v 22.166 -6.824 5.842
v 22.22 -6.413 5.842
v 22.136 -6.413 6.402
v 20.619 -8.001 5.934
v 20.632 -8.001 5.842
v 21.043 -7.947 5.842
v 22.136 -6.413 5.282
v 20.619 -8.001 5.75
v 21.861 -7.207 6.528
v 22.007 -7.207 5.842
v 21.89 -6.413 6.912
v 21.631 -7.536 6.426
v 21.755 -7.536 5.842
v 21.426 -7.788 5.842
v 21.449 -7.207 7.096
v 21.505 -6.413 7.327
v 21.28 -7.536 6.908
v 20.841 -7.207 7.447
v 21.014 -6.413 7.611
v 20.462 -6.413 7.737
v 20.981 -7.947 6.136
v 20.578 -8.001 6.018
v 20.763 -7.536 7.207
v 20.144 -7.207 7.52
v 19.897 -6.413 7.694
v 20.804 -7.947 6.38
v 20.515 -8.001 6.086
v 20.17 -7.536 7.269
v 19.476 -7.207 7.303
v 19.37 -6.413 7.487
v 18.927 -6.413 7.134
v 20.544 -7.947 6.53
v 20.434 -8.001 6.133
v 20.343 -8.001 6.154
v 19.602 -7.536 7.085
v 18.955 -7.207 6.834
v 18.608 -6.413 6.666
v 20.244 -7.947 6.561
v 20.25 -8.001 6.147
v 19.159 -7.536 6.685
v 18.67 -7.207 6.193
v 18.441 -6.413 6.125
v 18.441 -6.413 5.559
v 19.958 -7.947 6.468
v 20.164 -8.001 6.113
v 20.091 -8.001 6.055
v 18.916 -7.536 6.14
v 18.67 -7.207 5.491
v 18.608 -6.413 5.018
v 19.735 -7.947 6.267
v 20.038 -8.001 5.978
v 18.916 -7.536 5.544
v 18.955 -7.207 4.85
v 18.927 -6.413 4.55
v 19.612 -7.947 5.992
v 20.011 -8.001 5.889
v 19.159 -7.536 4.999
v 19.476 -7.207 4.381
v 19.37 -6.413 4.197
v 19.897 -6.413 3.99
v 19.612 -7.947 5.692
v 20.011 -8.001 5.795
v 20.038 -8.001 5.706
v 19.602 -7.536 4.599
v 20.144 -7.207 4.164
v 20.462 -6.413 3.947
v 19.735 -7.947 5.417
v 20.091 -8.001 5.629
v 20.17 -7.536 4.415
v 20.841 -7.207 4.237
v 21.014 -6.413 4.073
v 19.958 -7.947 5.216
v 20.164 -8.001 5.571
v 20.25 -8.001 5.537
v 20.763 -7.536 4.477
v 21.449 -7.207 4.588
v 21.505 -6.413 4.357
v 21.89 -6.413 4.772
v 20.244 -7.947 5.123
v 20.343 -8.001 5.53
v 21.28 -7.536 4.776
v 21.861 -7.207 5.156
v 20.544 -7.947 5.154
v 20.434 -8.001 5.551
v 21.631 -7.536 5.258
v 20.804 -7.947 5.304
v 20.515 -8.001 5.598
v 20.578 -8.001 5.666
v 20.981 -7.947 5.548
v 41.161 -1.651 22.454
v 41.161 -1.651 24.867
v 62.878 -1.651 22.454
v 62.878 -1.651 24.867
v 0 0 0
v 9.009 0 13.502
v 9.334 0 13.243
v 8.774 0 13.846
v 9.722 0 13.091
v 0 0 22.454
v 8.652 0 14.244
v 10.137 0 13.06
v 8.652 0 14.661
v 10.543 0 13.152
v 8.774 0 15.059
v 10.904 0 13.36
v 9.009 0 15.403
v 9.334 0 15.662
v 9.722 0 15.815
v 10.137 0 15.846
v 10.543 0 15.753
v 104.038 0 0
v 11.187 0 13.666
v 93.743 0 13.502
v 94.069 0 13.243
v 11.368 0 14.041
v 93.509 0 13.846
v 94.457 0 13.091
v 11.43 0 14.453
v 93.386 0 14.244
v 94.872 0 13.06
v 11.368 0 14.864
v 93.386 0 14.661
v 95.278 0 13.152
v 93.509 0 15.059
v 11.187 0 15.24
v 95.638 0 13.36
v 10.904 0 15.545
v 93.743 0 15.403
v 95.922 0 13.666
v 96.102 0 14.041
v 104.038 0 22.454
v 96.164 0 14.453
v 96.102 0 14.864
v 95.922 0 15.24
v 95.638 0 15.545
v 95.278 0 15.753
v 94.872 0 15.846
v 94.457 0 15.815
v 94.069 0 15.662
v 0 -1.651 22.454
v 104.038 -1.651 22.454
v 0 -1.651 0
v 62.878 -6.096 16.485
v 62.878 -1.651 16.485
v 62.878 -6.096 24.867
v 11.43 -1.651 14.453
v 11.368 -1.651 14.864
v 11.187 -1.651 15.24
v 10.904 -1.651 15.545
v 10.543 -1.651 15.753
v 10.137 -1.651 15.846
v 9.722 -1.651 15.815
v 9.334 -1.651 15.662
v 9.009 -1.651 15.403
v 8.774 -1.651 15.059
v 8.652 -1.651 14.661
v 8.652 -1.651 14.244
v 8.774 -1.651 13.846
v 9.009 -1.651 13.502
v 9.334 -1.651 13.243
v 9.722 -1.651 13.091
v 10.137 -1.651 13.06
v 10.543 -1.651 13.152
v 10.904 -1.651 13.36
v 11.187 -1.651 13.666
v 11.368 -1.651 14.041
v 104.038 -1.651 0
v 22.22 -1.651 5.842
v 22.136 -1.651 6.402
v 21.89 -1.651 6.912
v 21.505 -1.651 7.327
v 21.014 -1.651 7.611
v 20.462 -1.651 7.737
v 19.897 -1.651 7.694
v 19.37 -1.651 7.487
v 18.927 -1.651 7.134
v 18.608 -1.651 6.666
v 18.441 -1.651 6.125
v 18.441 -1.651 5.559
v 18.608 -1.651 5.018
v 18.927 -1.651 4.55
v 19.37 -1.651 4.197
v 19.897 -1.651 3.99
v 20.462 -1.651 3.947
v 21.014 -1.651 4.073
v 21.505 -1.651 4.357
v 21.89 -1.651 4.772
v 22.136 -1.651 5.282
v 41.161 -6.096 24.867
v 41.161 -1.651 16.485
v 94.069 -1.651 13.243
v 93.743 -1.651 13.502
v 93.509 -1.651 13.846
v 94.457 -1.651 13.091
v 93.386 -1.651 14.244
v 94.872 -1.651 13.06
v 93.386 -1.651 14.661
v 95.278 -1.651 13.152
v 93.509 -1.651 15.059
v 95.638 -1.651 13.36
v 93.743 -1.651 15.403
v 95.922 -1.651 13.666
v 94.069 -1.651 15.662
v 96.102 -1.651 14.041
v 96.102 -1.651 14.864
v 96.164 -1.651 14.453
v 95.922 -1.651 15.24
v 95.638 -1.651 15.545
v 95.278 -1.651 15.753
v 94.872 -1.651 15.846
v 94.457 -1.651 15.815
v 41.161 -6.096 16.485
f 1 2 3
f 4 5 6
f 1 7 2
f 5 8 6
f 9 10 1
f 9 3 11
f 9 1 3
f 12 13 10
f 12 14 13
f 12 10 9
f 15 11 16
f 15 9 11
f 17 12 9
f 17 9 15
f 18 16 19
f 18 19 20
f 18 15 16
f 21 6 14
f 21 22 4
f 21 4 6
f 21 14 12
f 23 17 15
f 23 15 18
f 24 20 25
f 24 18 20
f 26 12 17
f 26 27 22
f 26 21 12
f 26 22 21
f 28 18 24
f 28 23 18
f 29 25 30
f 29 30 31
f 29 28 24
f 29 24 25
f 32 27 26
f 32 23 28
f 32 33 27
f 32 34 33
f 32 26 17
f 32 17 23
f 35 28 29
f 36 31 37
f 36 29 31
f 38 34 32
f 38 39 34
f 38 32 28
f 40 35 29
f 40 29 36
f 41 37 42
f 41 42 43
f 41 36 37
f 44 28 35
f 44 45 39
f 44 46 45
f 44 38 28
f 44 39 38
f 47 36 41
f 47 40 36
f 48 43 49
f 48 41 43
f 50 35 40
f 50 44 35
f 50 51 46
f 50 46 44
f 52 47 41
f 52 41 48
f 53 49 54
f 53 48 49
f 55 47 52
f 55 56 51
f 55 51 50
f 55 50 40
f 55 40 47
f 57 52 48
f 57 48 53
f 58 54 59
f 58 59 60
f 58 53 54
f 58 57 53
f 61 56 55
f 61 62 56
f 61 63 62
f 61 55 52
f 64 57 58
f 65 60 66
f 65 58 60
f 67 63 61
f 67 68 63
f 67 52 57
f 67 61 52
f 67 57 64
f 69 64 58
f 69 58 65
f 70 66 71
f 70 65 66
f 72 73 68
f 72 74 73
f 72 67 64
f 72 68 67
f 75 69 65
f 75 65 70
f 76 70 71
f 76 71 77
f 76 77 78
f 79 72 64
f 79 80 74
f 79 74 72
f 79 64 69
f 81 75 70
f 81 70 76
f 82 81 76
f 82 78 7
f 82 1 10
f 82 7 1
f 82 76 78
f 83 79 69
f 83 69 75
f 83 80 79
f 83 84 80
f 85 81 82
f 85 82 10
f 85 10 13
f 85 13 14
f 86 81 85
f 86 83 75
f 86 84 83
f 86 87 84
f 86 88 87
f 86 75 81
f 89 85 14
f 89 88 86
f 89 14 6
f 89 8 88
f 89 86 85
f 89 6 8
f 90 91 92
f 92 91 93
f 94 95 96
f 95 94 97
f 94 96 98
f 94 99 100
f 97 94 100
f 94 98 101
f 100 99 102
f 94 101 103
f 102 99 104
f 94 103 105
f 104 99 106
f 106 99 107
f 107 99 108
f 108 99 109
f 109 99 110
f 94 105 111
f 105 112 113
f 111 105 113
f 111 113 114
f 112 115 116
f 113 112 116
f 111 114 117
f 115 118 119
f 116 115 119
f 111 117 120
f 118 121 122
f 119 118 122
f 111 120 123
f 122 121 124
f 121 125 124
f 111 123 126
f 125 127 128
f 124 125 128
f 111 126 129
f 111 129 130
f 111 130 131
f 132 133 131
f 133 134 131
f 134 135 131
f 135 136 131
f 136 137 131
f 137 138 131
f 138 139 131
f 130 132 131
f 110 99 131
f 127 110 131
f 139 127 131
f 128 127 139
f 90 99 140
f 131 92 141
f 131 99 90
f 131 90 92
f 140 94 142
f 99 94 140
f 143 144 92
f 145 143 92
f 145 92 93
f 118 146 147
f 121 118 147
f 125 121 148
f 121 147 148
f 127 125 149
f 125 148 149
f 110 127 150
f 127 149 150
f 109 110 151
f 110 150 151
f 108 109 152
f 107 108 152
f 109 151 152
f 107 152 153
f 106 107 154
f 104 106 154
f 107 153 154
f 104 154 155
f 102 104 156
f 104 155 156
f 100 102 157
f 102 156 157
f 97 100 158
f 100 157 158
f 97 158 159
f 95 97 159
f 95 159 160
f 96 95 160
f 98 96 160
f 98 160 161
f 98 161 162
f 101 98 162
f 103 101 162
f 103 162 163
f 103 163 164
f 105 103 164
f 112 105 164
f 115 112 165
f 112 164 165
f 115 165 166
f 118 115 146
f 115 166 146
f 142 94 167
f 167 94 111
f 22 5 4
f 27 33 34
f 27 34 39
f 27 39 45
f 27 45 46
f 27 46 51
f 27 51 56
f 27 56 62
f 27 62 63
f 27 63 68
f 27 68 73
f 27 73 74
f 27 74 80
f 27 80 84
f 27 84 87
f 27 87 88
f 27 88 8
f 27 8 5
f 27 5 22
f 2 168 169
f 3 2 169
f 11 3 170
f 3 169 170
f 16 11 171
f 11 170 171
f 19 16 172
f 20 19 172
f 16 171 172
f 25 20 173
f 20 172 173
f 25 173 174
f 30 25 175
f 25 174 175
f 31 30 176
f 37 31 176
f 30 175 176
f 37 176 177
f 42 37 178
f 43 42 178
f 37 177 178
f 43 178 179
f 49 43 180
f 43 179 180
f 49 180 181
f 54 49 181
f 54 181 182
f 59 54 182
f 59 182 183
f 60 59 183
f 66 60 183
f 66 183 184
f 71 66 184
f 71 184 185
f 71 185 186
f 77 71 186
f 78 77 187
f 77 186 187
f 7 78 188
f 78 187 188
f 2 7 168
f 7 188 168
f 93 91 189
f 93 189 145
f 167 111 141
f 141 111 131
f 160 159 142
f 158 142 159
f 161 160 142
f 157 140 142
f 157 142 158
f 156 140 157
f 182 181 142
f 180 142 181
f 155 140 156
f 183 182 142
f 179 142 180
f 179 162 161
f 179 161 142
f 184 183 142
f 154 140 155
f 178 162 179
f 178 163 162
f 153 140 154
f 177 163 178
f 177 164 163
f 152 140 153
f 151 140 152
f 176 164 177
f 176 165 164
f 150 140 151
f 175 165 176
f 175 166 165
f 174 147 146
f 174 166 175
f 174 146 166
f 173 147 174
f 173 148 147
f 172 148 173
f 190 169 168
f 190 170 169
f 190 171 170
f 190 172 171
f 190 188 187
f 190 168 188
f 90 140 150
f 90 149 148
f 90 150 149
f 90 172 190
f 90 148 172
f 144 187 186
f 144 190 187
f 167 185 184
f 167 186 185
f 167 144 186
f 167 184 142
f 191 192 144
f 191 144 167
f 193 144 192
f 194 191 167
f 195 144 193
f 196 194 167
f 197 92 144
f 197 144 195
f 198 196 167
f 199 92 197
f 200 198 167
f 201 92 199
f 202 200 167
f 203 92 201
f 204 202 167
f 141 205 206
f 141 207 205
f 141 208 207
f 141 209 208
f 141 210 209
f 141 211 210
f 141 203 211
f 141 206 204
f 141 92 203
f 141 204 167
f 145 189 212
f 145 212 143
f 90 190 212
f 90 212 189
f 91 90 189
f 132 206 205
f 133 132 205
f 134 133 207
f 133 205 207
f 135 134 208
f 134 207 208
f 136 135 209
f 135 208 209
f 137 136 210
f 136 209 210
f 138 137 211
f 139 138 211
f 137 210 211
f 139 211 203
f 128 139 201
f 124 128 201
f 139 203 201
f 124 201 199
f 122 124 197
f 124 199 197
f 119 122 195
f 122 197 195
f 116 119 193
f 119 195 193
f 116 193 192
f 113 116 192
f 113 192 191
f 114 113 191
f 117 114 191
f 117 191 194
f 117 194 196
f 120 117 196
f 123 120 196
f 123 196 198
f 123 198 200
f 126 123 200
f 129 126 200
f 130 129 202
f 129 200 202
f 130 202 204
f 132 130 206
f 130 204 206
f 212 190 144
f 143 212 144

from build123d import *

# Parameters (mm, degrees)
F0_W     = 104.0384
F0_H     = 22.4536
F1_DEPTH = 1.651
F2_R     = 1.9
F3_DEPTH = 6.35
F4_R     = 1.5875
F5_R     = 1.397
F6_DEPTH = 1.651
F7_W     = 21.717
F7_H     = 8.382
F8_DEPTH = 4.445


with BuildPart() as f1:
    # F0 (on Front) → F1 (new body)
    with BuildSketch(Plane.XZ):
        with Locations((52.0192, 11.2268)):
            Rectangle(F0_W, F0_H)
    extrude(amount=F1_DEPTH)

    # F2 (on face) → F3 (join)
    with BuildSketch(Plane.XZ.offset(1.651)):
        with Locations((20.32, 5.842)):
            Circle(F2_R)
    extrude(amount=F3_DEPTH)

    # F4
    f4_edges = [f1.edges().sort_by_distance(p)[0] for p in [
        (18.42, -8.001, 5.842),
    ]]
    fillet(f4_edges, radius=F4_R)

    # F5 (on face) → F6 (cut, through all)
    with BuildSketch(Plane.XZ.offset(1.651)):
        with Locations((10.033, 14.4526)):
            Circle(F5_R)
        with Locations((94.7674, 14.4526)):
            Circle(F5_R)
    extrude(amount=-F6_DEPTH, mode=Mode.SUBTRACT)

    # F7 (on face) → F8 (join)
    with BuildSketch(Plane.XZ.offset(1.651)):
        with Locations((52.0192, 20.6756)):
            Rectangle(F7_W, F7_H)
    extrude(amount=F8_DEPTH)


solid = f1.part
